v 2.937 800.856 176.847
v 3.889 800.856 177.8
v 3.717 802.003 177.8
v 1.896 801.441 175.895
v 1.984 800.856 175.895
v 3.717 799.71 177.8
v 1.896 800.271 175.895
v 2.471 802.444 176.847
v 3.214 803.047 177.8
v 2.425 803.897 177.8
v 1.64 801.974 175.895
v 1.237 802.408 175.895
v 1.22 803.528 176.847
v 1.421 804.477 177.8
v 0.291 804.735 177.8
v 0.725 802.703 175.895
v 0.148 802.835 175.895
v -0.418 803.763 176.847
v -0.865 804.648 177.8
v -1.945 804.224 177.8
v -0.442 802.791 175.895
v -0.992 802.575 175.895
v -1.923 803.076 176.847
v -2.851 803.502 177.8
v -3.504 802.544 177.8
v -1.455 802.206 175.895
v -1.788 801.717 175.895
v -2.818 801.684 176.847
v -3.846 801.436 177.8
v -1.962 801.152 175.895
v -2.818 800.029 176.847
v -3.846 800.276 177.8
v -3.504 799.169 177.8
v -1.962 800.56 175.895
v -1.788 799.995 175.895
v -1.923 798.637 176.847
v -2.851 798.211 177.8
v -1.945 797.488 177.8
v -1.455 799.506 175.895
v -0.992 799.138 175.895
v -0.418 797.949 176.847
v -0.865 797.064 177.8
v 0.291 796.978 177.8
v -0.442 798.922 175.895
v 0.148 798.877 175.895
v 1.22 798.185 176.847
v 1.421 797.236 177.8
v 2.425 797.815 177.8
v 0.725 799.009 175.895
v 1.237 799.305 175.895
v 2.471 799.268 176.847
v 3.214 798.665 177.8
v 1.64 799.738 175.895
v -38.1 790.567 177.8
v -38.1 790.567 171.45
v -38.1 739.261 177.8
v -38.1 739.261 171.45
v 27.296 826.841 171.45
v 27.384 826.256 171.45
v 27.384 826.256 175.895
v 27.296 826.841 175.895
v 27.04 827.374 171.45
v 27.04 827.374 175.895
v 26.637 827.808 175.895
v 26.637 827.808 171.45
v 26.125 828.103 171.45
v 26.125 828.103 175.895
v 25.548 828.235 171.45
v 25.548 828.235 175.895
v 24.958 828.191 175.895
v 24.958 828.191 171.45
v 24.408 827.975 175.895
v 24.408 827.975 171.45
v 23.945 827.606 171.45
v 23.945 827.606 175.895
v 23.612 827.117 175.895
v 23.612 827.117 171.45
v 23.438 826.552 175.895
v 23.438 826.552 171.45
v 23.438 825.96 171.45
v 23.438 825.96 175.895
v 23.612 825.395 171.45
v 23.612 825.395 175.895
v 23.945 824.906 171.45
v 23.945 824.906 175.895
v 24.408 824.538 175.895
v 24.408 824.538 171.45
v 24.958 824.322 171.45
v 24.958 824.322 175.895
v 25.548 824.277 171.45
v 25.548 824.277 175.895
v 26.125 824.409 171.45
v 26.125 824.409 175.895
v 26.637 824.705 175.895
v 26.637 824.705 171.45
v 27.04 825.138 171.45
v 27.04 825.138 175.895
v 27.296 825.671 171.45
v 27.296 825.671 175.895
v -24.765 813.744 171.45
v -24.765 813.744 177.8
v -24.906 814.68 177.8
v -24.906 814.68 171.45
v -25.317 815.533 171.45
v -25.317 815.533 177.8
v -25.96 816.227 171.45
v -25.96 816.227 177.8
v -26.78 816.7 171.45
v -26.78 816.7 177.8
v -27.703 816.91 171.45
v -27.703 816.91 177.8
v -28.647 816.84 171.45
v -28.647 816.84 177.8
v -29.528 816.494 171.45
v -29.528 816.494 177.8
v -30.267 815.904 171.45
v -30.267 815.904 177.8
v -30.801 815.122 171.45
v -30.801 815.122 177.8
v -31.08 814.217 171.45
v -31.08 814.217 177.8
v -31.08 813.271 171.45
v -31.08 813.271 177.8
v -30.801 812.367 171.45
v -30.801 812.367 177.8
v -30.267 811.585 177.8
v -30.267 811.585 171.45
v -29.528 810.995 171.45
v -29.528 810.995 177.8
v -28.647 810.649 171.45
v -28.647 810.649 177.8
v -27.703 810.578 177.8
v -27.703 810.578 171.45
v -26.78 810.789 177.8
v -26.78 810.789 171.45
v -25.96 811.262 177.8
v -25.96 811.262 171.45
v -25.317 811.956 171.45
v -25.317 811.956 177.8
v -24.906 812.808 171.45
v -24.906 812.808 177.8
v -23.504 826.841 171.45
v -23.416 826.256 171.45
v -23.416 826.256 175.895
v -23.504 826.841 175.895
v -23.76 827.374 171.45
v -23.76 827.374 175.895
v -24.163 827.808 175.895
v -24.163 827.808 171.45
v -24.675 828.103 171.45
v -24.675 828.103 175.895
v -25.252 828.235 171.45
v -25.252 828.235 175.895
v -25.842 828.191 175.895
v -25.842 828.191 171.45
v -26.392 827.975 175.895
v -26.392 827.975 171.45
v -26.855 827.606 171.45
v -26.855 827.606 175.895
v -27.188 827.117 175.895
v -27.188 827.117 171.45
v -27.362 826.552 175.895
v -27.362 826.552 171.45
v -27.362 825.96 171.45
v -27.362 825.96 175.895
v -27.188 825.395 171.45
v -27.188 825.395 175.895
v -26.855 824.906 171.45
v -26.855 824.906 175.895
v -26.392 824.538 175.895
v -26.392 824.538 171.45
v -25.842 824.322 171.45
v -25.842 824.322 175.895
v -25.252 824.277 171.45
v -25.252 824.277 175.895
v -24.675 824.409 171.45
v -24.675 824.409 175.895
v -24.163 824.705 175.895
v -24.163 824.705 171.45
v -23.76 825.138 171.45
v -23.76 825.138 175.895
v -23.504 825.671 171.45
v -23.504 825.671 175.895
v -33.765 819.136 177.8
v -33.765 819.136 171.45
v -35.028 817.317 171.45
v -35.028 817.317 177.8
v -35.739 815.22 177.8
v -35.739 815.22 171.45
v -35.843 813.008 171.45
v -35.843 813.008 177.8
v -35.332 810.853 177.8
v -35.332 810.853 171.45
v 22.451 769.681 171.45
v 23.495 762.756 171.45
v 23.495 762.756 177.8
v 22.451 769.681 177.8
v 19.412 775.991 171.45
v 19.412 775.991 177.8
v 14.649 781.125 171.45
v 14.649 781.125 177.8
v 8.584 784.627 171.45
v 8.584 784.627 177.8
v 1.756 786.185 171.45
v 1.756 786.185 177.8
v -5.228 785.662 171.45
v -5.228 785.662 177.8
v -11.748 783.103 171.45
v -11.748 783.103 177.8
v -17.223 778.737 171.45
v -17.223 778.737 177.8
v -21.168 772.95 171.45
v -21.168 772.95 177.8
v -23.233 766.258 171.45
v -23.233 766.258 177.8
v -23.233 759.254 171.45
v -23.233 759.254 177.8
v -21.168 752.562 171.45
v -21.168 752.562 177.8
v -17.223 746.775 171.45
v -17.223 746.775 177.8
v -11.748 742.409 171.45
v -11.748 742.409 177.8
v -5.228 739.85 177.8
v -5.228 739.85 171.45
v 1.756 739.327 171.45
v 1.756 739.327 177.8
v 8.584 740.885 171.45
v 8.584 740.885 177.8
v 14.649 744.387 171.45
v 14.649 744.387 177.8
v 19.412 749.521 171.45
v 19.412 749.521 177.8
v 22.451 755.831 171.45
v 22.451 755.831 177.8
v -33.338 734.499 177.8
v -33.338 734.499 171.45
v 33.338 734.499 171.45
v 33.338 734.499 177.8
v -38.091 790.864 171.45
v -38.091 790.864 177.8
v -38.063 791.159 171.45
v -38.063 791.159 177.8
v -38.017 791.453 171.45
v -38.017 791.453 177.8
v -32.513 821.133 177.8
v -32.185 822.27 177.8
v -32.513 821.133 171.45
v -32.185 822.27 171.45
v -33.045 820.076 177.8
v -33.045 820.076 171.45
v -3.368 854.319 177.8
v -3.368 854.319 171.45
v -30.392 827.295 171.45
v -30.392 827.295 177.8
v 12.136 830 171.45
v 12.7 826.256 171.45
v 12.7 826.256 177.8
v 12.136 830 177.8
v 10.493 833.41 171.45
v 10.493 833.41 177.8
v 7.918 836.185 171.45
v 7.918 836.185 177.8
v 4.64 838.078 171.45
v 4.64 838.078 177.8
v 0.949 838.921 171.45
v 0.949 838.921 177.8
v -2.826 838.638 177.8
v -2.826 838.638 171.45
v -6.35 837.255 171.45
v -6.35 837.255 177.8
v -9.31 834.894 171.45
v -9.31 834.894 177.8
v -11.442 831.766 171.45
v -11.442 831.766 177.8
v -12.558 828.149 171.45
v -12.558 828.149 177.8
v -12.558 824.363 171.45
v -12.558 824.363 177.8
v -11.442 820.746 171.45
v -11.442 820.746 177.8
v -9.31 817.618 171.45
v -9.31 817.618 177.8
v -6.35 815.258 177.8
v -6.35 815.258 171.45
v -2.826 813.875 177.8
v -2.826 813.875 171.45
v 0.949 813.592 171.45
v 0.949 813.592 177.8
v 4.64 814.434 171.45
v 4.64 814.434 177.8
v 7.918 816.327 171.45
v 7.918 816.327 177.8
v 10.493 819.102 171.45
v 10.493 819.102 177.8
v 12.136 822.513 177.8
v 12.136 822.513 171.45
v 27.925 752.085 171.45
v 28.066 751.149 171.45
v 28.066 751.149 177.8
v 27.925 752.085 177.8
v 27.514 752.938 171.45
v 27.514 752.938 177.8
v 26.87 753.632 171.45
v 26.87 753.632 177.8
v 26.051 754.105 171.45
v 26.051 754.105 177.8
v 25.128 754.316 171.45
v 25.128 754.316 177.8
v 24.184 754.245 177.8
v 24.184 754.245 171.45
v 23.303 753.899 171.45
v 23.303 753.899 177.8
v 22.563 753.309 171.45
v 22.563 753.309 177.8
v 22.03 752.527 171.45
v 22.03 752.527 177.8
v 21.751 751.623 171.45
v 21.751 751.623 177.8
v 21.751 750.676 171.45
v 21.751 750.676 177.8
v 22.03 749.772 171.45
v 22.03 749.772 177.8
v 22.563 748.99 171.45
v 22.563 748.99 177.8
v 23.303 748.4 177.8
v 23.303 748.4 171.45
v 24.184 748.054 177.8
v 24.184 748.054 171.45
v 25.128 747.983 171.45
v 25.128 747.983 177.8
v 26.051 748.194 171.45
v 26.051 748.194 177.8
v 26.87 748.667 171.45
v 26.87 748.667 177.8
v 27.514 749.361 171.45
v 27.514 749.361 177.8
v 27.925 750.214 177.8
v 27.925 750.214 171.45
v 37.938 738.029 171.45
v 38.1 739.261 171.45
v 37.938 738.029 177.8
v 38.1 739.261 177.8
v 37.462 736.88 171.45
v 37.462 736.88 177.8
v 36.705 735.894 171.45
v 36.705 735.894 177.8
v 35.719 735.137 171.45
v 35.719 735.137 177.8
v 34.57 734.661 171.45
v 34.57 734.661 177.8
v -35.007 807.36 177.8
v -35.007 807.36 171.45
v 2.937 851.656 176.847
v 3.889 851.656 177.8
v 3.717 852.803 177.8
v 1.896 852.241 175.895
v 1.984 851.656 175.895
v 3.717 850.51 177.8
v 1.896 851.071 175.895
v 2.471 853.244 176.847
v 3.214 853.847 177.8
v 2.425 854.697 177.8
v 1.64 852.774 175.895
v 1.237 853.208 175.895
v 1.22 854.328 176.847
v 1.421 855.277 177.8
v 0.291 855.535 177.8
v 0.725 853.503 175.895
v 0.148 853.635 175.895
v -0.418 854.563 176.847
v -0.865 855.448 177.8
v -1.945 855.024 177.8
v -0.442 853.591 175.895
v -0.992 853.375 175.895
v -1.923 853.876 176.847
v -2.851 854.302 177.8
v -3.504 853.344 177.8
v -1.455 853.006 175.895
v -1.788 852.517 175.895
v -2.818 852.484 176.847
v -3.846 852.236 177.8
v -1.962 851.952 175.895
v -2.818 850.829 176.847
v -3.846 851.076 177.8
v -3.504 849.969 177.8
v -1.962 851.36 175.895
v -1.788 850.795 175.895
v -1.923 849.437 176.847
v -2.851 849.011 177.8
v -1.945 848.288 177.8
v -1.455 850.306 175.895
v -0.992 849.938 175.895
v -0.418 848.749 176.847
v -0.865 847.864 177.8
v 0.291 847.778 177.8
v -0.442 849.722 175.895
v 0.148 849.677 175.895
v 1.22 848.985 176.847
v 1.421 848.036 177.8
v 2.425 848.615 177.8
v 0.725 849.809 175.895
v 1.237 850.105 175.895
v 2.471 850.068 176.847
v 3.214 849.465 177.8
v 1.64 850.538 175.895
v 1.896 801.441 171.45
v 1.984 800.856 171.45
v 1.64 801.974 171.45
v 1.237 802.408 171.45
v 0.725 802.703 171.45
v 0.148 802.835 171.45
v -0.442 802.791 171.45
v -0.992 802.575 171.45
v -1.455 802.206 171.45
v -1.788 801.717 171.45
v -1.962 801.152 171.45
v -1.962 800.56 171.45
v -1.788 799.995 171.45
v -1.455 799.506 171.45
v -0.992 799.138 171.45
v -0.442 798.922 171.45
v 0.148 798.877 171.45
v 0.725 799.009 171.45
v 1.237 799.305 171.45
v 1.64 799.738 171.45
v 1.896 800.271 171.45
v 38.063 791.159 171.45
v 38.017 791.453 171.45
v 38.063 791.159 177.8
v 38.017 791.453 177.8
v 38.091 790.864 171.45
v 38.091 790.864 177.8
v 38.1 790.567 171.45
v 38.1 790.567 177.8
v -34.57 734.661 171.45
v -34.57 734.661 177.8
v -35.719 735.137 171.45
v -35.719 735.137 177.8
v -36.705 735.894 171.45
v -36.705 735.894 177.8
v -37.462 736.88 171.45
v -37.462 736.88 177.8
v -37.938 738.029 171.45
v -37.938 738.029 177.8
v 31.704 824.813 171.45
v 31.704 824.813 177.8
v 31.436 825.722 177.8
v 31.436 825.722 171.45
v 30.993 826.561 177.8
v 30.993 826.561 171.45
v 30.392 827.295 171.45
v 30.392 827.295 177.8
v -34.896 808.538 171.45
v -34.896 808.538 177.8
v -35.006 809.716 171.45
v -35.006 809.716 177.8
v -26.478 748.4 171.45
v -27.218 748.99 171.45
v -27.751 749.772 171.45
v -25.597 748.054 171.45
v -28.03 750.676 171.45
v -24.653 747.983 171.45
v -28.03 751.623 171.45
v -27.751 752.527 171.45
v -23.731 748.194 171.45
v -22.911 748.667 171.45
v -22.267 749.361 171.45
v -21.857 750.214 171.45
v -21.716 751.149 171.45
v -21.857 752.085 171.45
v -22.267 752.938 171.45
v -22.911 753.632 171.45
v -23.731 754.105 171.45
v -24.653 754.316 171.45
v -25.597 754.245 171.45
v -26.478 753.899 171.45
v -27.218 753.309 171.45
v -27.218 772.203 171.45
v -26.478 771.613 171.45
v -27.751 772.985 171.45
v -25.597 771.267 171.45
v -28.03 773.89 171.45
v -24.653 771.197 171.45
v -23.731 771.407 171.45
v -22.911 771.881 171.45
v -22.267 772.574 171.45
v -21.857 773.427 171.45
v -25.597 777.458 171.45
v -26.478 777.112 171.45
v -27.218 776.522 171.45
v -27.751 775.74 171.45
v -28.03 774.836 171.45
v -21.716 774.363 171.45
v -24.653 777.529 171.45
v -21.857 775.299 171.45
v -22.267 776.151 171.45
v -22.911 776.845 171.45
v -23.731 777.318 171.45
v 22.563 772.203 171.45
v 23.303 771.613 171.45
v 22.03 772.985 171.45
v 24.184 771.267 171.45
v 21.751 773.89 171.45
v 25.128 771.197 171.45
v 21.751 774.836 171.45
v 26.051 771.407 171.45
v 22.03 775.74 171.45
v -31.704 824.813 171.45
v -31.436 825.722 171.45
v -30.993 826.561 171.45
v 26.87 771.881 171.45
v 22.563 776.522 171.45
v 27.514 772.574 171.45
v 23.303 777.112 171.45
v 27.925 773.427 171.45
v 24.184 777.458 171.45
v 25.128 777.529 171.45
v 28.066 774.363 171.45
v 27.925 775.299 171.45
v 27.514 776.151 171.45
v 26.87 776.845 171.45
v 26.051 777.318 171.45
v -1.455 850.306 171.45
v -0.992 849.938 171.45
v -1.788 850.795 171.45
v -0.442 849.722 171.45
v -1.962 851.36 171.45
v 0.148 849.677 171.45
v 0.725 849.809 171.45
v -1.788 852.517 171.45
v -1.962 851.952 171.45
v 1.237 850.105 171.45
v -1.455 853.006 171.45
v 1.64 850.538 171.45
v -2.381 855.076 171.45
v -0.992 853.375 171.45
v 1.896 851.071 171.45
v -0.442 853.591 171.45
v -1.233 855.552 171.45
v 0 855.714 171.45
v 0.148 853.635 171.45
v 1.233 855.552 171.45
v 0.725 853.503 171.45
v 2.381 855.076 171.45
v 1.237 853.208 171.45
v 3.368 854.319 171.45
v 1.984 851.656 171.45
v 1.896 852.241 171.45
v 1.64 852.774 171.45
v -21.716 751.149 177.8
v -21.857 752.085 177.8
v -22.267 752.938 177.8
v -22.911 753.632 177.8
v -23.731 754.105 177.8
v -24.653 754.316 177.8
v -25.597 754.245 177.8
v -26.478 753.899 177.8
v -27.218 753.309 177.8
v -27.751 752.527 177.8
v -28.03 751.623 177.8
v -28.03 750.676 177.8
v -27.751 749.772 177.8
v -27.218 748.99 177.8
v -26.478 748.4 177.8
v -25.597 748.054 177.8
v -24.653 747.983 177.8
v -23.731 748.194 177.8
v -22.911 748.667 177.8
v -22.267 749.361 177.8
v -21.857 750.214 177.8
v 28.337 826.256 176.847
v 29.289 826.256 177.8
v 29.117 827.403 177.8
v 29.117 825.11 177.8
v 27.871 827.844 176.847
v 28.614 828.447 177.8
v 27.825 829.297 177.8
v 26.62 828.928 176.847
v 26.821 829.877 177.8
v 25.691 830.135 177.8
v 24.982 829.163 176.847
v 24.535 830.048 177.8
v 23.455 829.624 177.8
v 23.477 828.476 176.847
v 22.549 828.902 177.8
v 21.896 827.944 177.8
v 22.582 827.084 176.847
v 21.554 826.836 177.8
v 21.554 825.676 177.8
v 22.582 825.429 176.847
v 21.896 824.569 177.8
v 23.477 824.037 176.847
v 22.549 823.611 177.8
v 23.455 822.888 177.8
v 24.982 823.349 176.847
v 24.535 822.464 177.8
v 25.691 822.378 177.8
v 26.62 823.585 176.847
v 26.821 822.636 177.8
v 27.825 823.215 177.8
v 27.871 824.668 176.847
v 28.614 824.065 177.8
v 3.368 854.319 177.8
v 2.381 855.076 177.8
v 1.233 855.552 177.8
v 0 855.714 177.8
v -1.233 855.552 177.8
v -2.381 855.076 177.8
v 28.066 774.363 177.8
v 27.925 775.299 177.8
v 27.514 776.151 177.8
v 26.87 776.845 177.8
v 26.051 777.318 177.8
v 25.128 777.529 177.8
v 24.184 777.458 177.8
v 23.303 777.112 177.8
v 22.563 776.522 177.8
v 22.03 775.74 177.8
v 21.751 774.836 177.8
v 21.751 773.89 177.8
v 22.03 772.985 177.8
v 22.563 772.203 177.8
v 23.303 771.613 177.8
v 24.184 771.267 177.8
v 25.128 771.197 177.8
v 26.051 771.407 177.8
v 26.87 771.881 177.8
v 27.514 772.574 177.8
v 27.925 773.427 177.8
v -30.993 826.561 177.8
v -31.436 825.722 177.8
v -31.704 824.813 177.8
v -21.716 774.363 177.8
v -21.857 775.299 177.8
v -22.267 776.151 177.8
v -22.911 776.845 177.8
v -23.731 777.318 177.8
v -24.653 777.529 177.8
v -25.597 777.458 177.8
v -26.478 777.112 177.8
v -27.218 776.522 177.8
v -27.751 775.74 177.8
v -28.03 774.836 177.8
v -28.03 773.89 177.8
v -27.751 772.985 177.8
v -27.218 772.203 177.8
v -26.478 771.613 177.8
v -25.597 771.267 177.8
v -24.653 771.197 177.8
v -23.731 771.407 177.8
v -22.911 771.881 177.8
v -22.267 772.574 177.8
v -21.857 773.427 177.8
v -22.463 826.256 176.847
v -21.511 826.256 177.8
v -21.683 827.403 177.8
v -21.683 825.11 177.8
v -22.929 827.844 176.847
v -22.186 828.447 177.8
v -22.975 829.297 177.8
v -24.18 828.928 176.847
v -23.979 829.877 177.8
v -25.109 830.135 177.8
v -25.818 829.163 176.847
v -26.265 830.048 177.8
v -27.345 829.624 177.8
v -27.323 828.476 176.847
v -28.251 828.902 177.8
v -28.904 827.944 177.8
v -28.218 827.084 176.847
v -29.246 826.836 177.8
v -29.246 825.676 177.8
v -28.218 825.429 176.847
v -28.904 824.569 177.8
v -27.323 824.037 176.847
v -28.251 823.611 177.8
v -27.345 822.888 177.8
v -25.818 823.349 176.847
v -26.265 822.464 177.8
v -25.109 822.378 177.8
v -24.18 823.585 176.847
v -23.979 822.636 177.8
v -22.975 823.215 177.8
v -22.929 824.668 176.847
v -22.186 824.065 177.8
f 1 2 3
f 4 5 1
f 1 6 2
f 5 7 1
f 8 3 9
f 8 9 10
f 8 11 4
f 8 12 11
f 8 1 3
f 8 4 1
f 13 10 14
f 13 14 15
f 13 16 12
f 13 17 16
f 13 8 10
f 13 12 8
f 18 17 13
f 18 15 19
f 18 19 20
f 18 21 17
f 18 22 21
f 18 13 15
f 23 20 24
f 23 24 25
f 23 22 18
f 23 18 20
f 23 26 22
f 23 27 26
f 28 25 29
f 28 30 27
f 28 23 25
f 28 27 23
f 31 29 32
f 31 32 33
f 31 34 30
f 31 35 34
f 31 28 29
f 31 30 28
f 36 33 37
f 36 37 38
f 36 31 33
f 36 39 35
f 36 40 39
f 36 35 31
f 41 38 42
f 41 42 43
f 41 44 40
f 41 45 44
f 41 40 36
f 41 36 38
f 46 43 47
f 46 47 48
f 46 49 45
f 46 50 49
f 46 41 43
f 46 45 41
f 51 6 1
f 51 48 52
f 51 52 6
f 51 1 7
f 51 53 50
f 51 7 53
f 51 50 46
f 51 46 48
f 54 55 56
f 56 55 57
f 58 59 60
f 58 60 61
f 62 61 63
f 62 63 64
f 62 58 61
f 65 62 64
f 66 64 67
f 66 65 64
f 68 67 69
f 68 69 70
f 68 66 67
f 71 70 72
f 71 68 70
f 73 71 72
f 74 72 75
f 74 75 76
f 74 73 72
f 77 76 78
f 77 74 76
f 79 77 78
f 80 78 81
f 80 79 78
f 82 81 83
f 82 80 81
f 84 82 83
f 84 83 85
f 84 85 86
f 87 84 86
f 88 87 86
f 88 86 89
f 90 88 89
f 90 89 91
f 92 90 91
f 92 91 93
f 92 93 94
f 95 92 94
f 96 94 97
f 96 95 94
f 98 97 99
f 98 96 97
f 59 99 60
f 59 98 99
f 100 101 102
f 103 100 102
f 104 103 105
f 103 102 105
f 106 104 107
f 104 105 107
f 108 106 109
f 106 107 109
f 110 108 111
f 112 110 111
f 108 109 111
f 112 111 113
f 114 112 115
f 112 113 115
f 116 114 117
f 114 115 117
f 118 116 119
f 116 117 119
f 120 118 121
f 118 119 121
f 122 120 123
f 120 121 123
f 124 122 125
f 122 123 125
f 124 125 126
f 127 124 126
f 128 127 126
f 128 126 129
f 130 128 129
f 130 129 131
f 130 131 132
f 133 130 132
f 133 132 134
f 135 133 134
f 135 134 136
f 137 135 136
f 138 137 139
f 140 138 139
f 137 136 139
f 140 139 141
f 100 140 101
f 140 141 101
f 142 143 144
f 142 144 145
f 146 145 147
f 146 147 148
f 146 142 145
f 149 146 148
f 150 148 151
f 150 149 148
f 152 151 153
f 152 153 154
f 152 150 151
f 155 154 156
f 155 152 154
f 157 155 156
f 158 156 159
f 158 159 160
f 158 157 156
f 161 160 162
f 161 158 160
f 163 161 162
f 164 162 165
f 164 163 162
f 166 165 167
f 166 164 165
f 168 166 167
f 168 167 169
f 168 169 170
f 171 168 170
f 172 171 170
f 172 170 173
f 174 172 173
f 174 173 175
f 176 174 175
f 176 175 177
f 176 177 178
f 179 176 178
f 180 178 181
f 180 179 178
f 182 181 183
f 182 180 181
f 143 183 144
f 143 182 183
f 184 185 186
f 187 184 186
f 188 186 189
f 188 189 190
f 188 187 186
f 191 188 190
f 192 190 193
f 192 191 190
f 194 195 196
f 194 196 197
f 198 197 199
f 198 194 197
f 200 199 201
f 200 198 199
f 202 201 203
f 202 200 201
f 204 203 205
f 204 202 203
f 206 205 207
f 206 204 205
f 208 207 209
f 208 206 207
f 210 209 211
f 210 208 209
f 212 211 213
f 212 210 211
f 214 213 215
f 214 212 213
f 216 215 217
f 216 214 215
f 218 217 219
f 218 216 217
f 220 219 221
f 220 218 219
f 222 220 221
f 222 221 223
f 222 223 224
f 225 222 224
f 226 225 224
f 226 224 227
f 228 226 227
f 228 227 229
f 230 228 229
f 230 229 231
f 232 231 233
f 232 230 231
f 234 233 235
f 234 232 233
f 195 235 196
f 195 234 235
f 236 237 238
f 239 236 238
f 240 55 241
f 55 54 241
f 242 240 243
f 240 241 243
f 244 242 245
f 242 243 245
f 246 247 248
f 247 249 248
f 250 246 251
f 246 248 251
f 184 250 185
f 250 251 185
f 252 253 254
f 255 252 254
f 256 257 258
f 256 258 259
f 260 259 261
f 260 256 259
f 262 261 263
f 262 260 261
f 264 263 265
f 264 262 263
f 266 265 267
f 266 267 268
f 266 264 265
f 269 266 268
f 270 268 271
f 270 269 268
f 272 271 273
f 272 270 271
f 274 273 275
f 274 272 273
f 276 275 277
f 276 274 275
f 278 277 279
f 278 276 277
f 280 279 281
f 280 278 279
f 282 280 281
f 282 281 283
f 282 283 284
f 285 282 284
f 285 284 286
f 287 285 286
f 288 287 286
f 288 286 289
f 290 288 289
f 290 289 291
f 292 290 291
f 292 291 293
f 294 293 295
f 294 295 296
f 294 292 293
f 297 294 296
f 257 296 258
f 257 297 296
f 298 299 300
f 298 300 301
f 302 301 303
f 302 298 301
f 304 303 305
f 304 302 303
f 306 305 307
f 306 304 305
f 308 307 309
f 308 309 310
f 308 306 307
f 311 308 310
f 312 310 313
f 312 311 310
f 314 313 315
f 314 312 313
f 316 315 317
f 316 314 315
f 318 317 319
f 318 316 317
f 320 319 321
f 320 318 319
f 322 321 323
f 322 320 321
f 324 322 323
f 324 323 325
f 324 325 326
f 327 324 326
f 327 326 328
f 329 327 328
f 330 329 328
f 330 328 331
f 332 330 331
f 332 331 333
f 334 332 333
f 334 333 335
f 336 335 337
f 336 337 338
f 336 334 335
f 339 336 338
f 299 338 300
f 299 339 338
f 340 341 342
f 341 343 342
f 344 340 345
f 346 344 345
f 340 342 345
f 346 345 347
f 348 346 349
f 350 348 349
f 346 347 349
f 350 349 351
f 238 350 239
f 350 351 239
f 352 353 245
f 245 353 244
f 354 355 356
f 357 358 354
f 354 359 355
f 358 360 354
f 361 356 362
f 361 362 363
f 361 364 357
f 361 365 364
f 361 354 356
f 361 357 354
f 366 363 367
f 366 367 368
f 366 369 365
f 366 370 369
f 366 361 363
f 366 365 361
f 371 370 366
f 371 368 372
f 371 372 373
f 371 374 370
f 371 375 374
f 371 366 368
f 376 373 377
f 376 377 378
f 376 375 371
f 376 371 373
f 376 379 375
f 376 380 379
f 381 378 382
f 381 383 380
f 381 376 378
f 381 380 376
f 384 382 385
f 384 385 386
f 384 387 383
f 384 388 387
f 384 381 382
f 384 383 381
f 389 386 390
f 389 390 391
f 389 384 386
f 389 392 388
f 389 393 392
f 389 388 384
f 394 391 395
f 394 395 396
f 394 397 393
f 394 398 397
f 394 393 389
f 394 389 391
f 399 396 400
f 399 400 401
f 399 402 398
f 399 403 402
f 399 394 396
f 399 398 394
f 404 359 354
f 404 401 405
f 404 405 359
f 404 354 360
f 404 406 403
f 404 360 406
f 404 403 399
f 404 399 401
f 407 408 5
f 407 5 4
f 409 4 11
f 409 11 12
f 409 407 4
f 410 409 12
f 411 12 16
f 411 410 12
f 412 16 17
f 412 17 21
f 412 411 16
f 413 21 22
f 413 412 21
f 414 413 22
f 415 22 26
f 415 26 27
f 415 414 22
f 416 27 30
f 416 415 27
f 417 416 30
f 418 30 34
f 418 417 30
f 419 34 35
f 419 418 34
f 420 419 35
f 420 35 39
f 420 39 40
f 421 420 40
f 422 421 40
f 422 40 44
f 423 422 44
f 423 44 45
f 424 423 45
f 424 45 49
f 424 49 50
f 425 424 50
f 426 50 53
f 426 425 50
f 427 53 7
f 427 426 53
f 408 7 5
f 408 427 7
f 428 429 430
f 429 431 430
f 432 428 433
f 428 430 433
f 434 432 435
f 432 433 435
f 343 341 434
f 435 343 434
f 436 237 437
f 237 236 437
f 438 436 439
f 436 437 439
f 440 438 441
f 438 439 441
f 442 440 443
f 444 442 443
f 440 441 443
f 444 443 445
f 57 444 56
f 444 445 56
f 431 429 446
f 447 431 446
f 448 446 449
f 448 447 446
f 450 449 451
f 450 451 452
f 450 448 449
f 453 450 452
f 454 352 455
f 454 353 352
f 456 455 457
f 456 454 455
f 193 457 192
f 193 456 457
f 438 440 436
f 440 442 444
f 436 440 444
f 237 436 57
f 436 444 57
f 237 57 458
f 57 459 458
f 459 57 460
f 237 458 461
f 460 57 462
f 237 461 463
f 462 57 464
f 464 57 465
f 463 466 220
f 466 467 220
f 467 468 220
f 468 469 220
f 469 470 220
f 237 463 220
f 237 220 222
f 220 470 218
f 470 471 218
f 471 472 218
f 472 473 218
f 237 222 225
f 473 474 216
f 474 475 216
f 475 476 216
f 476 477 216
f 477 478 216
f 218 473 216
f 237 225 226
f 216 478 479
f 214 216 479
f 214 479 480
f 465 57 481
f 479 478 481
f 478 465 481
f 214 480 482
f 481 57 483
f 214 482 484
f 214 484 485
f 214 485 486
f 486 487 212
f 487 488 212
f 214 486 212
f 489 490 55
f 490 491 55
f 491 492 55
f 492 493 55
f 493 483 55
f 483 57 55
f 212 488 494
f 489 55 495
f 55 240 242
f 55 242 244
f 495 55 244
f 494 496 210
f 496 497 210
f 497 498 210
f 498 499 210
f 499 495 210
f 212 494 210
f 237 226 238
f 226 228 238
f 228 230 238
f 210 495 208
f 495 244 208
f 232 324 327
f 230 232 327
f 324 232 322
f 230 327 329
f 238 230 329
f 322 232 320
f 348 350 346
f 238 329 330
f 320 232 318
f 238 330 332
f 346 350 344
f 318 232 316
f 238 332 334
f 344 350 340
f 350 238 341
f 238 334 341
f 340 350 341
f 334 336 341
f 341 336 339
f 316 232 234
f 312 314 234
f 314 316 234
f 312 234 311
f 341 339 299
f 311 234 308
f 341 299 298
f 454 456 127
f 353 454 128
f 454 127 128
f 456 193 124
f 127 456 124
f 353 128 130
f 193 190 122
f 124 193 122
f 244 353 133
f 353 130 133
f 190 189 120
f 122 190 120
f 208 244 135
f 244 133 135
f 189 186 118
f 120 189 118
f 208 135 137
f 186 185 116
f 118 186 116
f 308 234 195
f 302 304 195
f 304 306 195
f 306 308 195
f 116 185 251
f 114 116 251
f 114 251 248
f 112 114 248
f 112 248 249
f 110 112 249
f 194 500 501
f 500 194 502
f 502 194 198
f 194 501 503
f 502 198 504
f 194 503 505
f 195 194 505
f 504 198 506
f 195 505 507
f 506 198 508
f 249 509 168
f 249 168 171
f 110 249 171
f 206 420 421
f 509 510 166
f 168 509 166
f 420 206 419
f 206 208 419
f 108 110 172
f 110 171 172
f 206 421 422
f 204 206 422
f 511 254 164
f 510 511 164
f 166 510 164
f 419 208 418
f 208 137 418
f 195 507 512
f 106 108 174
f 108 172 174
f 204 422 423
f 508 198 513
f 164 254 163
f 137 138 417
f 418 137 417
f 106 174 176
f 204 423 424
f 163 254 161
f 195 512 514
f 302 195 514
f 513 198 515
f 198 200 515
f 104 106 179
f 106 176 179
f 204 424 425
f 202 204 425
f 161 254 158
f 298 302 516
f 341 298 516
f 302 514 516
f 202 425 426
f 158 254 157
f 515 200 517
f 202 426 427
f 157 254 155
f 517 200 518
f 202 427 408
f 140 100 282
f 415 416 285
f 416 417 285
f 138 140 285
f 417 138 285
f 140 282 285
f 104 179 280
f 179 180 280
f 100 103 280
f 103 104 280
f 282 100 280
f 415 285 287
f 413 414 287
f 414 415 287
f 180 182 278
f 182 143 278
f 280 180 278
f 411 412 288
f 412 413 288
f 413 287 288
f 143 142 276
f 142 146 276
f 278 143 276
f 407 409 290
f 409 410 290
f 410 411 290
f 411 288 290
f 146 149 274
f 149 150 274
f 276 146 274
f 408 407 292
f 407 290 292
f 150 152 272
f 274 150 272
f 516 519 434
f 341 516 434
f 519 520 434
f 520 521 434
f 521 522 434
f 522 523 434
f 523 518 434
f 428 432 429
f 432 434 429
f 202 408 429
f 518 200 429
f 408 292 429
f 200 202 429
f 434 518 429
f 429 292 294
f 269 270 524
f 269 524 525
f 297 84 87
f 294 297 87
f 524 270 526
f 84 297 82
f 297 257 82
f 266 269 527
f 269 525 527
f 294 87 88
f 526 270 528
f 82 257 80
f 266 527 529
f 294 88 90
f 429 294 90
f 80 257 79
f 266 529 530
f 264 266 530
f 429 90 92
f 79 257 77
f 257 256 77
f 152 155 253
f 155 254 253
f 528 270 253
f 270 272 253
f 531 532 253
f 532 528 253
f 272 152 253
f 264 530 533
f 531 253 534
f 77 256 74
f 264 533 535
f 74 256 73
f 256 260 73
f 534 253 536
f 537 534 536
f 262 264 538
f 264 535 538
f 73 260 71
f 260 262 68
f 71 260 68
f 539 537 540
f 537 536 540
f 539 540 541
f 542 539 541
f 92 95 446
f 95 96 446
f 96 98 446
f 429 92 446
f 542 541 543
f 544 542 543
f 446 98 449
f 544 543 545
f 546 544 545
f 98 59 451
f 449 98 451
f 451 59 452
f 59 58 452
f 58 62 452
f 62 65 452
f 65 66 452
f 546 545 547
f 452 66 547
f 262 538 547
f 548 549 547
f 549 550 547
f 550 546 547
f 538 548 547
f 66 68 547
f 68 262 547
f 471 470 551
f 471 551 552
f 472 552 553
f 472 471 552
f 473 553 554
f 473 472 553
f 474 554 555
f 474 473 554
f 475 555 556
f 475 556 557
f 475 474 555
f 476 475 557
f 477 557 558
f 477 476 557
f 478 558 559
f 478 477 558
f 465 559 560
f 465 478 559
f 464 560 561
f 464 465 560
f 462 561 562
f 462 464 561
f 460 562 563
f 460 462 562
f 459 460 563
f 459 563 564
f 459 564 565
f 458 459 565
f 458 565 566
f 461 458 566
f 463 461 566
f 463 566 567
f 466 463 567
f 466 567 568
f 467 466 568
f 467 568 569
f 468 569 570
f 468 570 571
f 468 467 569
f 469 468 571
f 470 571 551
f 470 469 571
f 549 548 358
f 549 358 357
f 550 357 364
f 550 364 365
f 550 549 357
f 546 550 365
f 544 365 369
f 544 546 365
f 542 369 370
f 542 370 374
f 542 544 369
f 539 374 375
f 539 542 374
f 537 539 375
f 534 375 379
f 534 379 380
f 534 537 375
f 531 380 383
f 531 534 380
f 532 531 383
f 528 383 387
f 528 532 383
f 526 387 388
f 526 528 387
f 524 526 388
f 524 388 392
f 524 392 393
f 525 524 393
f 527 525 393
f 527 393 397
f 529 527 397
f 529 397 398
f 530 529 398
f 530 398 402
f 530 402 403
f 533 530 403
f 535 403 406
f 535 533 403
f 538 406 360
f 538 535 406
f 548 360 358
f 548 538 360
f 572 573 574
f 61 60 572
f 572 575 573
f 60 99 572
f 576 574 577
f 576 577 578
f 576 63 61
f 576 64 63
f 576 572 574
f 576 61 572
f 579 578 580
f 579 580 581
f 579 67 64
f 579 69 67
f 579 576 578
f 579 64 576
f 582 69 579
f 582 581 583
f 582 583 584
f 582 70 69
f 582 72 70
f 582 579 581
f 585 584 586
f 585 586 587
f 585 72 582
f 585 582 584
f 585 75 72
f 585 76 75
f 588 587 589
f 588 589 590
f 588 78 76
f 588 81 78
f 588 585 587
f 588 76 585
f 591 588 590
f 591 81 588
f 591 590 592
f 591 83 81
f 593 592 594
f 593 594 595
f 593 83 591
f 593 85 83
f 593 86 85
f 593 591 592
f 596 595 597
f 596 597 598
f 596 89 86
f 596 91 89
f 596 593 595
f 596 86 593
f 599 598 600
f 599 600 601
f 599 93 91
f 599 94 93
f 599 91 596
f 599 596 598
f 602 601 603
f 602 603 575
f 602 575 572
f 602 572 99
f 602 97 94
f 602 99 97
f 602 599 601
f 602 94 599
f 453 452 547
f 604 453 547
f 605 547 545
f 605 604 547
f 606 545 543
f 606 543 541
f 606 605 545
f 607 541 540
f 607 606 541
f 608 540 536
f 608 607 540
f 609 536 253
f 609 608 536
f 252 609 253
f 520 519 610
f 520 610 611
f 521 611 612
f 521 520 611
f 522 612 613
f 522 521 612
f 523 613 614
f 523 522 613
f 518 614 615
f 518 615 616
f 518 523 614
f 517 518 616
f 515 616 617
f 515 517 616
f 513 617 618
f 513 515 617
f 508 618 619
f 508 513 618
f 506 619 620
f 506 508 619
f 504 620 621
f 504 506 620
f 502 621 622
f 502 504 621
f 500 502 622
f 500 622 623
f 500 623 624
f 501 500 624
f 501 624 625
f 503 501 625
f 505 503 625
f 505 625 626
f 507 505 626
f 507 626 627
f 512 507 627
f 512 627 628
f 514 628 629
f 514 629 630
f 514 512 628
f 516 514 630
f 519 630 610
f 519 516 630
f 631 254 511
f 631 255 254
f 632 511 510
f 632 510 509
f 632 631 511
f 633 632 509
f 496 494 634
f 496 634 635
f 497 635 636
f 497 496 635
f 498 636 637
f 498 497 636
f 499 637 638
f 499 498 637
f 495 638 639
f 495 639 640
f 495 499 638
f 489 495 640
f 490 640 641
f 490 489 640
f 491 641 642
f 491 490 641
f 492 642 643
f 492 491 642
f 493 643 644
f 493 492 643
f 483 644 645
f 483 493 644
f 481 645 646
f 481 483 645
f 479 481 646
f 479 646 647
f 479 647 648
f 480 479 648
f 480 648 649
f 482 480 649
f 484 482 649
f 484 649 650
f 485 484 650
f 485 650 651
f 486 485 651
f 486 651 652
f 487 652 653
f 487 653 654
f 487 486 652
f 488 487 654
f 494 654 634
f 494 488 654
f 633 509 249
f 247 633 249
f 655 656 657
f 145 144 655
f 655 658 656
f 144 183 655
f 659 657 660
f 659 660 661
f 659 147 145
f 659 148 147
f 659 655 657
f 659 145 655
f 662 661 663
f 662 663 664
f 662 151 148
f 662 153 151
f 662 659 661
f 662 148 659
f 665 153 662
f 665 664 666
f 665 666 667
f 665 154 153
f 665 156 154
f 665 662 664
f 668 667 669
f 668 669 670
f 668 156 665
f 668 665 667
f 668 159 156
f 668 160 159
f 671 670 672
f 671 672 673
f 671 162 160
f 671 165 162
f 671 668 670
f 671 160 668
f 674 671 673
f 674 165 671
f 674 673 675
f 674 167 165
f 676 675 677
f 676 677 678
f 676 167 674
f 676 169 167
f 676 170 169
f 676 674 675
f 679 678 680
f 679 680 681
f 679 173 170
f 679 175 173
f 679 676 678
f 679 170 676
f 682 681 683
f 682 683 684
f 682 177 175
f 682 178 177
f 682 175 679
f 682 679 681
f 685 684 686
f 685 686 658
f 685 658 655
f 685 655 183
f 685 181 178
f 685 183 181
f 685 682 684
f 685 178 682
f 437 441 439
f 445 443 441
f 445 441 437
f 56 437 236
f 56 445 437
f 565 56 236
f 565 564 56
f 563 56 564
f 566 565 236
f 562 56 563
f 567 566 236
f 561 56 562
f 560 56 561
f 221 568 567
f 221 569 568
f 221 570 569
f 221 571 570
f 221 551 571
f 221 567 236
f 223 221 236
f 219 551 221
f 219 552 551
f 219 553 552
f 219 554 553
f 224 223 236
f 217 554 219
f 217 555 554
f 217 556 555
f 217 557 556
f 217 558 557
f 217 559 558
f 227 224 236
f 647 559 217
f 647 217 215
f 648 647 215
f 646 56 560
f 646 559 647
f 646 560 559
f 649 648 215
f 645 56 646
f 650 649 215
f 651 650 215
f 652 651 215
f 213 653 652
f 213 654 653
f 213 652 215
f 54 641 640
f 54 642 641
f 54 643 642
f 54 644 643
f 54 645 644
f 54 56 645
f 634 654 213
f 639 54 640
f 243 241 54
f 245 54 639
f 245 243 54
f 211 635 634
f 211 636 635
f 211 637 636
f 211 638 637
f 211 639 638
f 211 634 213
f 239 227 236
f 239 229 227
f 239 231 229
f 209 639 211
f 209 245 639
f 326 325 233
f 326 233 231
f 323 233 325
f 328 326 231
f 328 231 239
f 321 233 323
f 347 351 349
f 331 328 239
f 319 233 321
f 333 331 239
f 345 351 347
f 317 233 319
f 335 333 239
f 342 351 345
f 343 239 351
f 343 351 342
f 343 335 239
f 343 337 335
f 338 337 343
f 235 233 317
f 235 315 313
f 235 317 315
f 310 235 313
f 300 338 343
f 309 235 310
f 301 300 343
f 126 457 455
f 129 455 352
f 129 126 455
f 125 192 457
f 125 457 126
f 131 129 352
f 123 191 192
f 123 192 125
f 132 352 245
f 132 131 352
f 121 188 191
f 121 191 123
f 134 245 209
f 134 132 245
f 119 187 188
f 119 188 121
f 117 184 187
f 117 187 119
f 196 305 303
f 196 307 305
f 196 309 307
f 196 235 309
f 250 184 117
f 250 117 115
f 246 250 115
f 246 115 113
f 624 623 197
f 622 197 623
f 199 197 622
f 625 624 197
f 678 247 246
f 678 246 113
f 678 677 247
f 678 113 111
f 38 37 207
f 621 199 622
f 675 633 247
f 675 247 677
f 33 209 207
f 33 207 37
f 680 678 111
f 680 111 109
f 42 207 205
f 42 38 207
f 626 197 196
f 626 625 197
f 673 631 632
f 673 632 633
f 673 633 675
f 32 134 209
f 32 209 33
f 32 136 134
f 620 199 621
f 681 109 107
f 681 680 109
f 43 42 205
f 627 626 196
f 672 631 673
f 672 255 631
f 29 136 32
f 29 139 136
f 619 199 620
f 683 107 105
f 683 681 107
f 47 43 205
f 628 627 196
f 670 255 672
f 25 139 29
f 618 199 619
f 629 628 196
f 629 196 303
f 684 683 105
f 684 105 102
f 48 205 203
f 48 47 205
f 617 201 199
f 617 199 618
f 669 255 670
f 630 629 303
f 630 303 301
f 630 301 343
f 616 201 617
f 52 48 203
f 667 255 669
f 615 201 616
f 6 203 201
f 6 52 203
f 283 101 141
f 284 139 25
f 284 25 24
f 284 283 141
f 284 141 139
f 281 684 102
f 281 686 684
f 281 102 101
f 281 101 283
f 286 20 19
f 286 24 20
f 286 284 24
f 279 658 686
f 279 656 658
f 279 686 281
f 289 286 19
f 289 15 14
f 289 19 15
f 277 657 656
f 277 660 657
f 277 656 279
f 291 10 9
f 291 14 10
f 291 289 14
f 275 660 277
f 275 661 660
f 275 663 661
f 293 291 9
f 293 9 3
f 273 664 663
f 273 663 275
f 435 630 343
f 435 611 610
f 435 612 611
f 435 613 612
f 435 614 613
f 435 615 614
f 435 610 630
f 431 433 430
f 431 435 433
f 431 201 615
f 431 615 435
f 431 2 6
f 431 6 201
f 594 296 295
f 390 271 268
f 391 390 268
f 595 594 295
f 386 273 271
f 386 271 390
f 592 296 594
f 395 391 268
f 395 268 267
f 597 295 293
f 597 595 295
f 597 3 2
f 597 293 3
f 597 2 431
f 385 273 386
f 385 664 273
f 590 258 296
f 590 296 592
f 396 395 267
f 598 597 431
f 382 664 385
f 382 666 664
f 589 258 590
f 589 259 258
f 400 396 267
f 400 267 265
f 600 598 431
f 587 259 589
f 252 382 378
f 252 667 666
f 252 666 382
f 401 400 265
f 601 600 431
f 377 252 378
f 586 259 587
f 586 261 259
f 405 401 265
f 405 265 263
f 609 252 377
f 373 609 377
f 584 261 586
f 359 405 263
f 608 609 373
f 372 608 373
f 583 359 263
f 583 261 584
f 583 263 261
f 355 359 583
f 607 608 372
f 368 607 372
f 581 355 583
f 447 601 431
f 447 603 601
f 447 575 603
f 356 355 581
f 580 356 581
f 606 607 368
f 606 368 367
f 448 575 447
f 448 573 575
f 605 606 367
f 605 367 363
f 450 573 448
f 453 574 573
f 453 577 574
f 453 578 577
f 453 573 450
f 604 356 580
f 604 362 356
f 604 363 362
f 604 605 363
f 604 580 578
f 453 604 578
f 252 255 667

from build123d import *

# Parameters (mm, degrees)
SKETCH1_R           = 23.495
SKETCH1_R_2         = 3.175
SKETCH1_R_3         = 12.7
SKETCH1_R_4         = 1.984375
BOSS_EXTRUDE1_DEPTH = 6.35
FILLET1_R           = 4.7625
SKETCH2_R           = 3.175
CUT_EXTRUDE1_DEPTH  = 6.35
SKETCH2_3_R         = 3.175
BOSS_EXTRUDE2_DEPTH = 6.35
FILLET2_R           = 6.35
CHAMFER1_SIZE       = 1.905


with BuildPart() as part:
    # Sketch1 → Boss-Extrude1 (new body)
    with BuildSketch(Plane.XY.offset(171.45)):
        Polygon((38.1, 791.013640976), (31.430896424, 826.256140976), (0, 857.6870374), (-31.430896424, 826.256140976), (-38.1, 791.013640976), (-38.1, 734.498640976), (38.1, 734.498640976), align=None)
        with Locations((0, 762.756140976)):
            Circle(SKETCH1_R, mode=Mode.SUBTRACT)
        with Locations((-24.890610486, 774.362823262)):
            Circle(SKETCH1_R_2, mode=Mode.SUBTRACT)
        with Locations((24.890610486, 774.362823262)):
            Circle(SKETCH1_R_2, mode=Mode.SUBTRACT)
        with Locations((0, 826.256140976)):
            Circle(SKETCH1_R_3, mode=Mode.SUBTRACT)
        with Locations((-25.4, 826.256140976)):
            Circle(SKETCH1_R_4, mode=Mode.SUBTRACT)
        with Locations((0, 851.656140976)):
            Circle(SKETCH1_R_4, mode=Mode.SUBTRACT)
        with Locations((25.4, 826.256140976)):
            Circle(SKETCH1_R_4, mode=Mode.SUBTRACT)
        with Locations((0, 800.856140976)):
            Circle(SKETCH1_R_4, mode=Mode.SUBTRACT)
        with Locations((24.890610486, 751.14945869)):
            Circle(SKETCH1_R_2, mode=Mode.SUBTRACT)
        with Locations((-24.890610486, 751.14945869)):
            Circle(SKETCH1_R_2, mode=Mode.SUBTRACT)
    extrude(amount=BOSS_EXTRUDE1_DEPTH)

    # Fillet1
    fillet1_edges = [part.edges().sort_by_distance(p)[0] for p in [
        (0, 857.6870374, 174.625),
        (31.430896424, 826.256140976, 174.625),
        (38.1, 791.013640976, 174.625),
        (38.1, 734.498640976, 174.625),
        (-38.1, 734.498640976, 174.625),
        (-38.1, 791.013640976, 174.625),
        (-31.430896424, 826.256140976, 174.625),
    ]]
    fillet(fillet1_edges, radius=FILLET1_R)

    # Sketch2 → Cut-Extrude1 (cut)
    with BuildSketch(Plane.XY.offset(177.8)):
        with Locations((-27.94, 813.744260544)):
            Circle(SKETCH2_R)
    extrude(amount=-CUT_EXTRUDE1_DEPTH, mode=Mode.SUBTRACT)

    # Sketch2<3> → Boss-Extrude2 (add)
    # profile 1 of 2: a face of its own
    with BuildSketch(Plane.XY.offset(177.8)):
        with BuildLine():
            ThreePointArc((-34.612193634, 809.444756111), (-25.699088435, 806.129654736), (-20.0025, 813.744260544))
            ThreePointArc((-20.0025, 813.744260544), (-24.322344832, 820.809419943), (-32.579880116, 820.18440175))
            Line((-32.579880116, 820.18440175), (-34.612193634, 809.444756111))
        make_face()
        with Locations((-27.94, 813.744260544)):
            Circle(SKETCH2_3_R, mode=Mode.SUBTRACT)
    # profile 2 of 2: a face of its own
    with BuildSketch(Plane.XY.offset(177.8)):
        with BuildLine():
            Line((-34.612193634, 809.444756111), (-32.579880116, 820.18440175))
            ThreePointArc((-32.579880116, 820.18440175), (-35.739086501, 815.220118263), (-34.612193634, 809.444756111))
        make_face()
    extrude(amount=-BOSS_EXTRUDE2_DEPTH)

    # Fillet2
    fillet2_edges = [part.edges().sort_by_distance(p)[0] for p in [
        (-32.579880116, 820.18440175, 174.625),
        (-34.612193634, 809.444756111, 174.625),
    ]]
    fillet(fillet2_edges, radius=FILLET2_R)

    # Chamfer1
    chamfer1_edges = [part.edges().sort_by_distance(p)[0] for p in [
        (-27.384375, 826.256140976, 177.8),
        (-1.984375, 851.656140976, 177.8),
        (23.415625, 826.256140976, 177.8),
        (-1.984375, 800.856140976, 177.8),
    ]]
    chamfer(chamfer1_edges, length=CHAMFER1_SIZE)


solid = part.part
